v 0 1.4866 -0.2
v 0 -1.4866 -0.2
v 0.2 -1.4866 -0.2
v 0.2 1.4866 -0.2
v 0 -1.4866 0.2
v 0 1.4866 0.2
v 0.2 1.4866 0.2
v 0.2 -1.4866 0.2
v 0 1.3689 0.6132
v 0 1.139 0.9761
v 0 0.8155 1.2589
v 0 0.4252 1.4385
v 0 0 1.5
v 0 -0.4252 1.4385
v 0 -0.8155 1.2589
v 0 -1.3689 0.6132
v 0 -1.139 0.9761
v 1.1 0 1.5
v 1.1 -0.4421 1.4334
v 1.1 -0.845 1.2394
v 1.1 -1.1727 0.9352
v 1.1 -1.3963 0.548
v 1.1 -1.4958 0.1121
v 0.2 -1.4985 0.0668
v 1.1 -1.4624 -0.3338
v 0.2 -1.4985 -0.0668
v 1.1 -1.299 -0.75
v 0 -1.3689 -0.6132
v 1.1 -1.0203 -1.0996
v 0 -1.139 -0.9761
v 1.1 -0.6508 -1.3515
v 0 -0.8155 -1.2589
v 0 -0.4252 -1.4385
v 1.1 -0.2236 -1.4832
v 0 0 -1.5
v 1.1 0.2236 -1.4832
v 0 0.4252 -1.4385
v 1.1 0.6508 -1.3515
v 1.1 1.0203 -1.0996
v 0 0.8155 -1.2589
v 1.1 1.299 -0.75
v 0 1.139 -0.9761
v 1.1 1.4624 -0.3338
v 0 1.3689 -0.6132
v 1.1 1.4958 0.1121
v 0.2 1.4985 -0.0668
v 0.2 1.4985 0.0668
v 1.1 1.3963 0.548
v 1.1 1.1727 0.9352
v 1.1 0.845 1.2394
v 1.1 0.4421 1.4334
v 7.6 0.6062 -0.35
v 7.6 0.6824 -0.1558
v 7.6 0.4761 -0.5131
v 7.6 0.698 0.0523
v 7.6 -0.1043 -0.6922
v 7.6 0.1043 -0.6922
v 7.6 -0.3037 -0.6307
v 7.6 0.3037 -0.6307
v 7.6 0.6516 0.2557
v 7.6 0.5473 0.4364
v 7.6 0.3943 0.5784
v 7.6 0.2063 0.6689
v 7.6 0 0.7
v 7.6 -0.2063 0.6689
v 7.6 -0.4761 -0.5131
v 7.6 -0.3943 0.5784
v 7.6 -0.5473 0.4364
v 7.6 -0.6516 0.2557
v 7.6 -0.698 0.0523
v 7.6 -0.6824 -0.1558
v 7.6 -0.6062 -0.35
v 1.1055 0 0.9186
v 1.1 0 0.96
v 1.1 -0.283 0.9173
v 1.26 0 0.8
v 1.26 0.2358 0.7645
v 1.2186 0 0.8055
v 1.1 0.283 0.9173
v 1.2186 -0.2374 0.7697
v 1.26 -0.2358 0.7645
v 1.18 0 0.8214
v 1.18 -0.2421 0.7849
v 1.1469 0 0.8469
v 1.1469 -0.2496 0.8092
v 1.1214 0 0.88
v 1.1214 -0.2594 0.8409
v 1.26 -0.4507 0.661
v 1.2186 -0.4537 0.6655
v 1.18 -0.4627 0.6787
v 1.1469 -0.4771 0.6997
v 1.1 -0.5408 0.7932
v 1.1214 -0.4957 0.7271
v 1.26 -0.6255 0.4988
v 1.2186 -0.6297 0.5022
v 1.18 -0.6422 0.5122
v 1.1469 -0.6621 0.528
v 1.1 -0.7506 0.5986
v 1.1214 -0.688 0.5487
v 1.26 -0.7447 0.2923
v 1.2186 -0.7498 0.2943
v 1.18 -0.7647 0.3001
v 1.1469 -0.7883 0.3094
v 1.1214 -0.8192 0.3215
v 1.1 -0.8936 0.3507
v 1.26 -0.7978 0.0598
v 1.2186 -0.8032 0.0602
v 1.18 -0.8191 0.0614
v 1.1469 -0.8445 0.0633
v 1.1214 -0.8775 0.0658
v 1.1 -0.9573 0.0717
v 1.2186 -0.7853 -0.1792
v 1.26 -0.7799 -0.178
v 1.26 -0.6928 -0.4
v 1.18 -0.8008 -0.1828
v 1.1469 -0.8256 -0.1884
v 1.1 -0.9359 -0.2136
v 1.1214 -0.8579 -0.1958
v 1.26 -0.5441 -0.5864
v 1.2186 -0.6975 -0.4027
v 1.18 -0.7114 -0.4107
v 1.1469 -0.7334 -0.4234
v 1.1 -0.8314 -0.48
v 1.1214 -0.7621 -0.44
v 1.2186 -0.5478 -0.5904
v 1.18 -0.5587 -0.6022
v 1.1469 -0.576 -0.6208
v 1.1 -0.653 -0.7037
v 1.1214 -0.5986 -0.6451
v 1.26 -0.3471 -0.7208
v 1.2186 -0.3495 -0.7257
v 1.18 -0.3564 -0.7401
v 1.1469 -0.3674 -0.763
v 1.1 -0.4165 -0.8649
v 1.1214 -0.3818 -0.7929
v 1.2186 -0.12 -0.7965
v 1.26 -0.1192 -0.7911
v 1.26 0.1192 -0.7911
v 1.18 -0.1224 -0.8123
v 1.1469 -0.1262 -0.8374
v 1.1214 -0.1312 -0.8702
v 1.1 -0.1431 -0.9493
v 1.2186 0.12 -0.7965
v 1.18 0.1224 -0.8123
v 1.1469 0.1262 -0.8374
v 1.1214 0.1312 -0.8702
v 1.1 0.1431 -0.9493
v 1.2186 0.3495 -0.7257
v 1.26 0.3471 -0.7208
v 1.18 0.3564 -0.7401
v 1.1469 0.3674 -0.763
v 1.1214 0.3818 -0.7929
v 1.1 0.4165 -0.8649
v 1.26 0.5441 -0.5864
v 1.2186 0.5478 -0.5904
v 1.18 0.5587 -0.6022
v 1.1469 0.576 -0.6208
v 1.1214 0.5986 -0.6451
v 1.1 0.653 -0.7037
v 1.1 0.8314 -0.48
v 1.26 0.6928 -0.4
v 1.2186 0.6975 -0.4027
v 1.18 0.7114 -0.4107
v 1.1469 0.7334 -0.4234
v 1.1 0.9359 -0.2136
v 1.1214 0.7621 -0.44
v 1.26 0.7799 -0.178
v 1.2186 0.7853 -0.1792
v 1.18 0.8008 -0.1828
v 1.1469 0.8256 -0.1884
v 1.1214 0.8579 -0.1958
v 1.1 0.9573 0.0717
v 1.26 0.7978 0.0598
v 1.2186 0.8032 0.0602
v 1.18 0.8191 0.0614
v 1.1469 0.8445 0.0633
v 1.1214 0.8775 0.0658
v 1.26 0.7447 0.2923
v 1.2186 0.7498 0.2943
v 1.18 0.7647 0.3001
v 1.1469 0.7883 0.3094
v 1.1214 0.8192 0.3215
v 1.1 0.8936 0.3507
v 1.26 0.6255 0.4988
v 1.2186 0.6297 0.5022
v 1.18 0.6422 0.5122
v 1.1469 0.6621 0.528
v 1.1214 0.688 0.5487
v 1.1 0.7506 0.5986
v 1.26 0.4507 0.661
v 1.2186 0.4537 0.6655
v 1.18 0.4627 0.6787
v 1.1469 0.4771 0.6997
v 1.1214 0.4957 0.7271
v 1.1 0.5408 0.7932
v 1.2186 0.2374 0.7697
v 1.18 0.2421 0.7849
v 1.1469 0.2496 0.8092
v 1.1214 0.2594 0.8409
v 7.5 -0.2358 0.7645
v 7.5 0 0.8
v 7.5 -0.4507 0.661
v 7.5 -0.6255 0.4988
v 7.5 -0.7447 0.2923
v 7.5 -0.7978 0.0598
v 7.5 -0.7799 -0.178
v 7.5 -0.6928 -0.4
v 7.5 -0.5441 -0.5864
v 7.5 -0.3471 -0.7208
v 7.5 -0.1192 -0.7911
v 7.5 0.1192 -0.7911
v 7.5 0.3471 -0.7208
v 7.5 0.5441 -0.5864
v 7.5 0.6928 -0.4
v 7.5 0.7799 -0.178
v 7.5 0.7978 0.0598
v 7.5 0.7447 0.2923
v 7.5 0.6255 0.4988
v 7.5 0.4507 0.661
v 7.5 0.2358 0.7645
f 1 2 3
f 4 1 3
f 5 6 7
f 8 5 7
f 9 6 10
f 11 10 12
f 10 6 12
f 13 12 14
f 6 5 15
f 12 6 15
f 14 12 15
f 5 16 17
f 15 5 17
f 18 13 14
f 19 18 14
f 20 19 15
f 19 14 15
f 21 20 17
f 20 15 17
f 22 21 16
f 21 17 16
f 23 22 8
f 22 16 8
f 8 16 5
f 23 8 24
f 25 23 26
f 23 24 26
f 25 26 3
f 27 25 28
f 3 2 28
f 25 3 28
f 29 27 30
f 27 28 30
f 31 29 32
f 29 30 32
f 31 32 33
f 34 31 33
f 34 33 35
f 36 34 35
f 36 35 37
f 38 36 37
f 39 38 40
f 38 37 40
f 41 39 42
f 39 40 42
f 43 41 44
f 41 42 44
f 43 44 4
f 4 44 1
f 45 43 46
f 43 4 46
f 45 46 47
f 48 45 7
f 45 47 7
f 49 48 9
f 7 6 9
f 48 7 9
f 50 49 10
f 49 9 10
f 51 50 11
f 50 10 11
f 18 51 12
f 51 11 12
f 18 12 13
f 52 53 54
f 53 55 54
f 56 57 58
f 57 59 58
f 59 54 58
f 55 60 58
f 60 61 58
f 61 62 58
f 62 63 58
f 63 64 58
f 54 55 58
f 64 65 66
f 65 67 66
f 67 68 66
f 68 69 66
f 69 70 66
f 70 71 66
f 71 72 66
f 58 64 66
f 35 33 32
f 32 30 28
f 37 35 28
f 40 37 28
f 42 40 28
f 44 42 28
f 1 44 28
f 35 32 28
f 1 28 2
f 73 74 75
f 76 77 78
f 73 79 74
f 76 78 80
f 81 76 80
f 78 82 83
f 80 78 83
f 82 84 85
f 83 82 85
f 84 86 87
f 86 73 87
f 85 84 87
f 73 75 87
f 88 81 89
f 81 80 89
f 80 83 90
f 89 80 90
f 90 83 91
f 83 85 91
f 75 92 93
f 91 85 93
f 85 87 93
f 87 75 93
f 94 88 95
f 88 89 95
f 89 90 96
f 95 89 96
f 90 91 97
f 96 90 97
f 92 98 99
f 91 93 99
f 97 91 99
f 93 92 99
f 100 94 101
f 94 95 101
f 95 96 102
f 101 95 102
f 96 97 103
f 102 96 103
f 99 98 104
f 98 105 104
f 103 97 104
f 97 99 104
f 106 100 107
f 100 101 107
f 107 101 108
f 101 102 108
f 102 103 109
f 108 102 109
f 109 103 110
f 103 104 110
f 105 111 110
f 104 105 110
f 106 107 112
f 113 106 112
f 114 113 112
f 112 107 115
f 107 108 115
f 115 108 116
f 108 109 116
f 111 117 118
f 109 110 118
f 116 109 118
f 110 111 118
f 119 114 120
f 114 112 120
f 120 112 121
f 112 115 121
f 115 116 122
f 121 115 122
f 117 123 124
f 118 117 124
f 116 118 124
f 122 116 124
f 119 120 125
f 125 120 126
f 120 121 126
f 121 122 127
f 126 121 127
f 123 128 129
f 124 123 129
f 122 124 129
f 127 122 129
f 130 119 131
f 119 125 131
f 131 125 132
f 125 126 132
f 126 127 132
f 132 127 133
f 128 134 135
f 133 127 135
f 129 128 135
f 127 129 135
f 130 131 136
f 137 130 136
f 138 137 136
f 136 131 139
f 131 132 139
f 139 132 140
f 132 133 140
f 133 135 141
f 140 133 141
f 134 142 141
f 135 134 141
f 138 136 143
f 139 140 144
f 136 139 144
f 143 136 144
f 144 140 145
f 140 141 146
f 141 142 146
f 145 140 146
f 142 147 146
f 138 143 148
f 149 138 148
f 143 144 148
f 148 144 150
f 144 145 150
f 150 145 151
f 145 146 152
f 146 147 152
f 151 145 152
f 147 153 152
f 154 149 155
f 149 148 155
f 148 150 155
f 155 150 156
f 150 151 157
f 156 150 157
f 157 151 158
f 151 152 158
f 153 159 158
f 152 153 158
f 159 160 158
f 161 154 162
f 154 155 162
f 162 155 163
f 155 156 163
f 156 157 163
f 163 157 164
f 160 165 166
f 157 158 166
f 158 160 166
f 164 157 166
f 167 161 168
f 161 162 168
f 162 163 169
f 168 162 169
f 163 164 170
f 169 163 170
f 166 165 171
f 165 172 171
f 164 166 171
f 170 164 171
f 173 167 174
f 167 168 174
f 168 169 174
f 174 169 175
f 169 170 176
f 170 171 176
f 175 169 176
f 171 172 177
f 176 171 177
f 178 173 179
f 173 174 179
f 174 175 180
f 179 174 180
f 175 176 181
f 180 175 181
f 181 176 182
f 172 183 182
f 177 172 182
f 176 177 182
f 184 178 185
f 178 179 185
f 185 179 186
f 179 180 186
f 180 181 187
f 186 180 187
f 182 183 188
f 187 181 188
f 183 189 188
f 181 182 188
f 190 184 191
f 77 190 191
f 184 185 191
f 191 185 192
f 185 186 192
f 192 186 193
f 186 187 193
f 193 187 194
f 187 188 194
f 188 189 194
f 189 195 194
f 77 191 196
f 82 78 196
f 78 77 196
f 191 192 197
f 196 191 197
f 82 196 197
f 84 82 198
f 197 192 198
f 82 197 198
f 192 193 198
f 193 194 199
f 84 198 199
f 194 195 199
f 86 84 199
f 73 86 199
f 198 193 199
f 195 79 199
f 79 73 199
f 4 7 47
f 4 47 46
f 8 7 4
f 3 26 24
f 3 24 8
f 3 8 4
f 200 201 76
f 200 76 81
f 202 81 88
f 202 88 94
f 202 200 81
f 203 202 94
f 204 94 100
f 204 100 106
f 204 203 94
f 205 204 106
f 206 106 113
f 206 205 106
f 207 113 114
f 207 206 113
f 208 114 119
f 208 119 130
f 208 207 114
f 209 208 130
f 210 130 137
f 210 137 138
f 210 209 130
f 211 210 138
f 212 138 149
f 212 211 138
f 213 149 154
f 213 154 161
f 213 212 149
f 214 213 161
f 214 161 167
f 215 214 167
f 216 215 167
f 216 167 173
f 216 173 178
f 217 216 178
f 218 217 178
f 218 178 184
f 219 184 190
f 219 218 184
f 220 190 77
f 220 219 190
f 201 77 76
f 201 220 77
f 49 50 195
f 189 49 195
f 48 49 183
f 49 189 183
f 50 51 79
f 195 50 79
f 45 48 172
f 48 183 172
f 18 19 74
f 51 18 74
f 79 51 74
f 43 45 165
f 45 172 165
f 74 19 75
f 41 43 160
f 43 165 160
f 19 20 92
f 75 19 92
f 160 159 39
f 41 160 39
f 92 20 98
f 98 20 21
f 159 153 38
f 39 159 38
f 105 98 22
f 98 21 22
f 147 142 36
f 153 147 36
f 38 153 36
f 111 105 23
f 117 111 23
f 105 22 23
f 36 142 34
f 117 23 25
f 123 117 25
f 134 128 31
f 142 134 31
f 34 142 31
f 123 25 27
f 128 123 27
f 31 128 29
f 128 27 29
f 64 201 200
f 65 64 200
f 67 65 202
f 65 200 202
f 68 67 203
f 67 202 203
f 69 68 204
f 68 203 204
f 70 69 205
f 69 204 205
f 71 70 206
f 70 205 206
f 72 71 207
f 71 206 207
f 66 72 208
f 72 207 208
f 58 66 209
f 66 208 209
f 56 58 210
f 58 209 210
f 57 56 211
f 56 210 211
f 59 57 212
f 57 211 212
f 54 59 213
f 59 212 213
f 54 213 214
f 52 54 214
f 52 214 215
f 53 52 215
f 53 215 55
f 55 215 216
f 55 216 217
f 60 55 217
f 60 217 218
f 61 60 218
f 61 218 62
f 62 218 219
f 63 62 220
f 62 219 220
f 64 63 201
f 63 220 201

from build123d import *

# Parameters (mm, degrees)
SKETCH1_W           = 6.5
SKETCH1_H           = 0.8
CHAMFER1_SIZE       = 0.1
FILLET1_R           = 0.16
EXTRUDE1_DEPTH      = 8.890500618
EXTRUDE1_DEPTH_BACK = 8.890500618
SKETCH2_W           = 0.2
SKETCH2_H           = 0.2


with BuildPart() as part:
    # Sketch1 → Revolve1 (revolve)
    with BuildSketch(Plane.XY, mode=Mode.PRIVATE) as revolve1_sk:
        Polygon((0, 1.5), (0, 0), (1.1, 0), (1.1, 0.8), (1.1, 1.5), align=None)
        with Locations((4.35, 0.4)):
            Rectangle(SKETCH1_W, SKETCH1_H)
    revolve(revolve1_sk.sketch.rotate(Axis((0, 0, 0), (1, 0, 0)), 90), axis=Axis((0, 0, 0), (1, 0, 0)))

    # Chamfer1
    chamfer1_edges = [part.edges().sort_by_distance(p)[0] for p in [
        (7.6, 0, -0.8),
    ]]
    chamfer(chamfer1_edges, length=CHAMFER1_SIZE)

    # Fillet1
    fillet1_edges = [part.edges().sort_by_distance(p)[0] for p in [
        (1.1, 0, -0.8),
    ]]
    fillet(fillet1_edges, radius=FILLET1_R)

    # Sketch2 → Extrude1 (cut, two sides: drawn at the far end of the back side and taken through both)
    with BuildSketch(Plane(origin=(0, 0, 0), x_dir=(1, 0, 0), z_dir=(0, 1, 0)).offset(-EXTRUDE1_DEPTH_BACK)):
        with Locations((0.1, -0.1)):
            Rectangle(SKETCH2_W, SKETCH2_H)
        with Locations((0.1, 0.1)):
            Rectangle(SKETCH2_W, SKETCH2_H)
    extrude(amount=EXTRUDE1_DEPTH + EXTRUDE1_DEPTH_BACK, mode=Mode.SUBTRACT)


solid = part.part
